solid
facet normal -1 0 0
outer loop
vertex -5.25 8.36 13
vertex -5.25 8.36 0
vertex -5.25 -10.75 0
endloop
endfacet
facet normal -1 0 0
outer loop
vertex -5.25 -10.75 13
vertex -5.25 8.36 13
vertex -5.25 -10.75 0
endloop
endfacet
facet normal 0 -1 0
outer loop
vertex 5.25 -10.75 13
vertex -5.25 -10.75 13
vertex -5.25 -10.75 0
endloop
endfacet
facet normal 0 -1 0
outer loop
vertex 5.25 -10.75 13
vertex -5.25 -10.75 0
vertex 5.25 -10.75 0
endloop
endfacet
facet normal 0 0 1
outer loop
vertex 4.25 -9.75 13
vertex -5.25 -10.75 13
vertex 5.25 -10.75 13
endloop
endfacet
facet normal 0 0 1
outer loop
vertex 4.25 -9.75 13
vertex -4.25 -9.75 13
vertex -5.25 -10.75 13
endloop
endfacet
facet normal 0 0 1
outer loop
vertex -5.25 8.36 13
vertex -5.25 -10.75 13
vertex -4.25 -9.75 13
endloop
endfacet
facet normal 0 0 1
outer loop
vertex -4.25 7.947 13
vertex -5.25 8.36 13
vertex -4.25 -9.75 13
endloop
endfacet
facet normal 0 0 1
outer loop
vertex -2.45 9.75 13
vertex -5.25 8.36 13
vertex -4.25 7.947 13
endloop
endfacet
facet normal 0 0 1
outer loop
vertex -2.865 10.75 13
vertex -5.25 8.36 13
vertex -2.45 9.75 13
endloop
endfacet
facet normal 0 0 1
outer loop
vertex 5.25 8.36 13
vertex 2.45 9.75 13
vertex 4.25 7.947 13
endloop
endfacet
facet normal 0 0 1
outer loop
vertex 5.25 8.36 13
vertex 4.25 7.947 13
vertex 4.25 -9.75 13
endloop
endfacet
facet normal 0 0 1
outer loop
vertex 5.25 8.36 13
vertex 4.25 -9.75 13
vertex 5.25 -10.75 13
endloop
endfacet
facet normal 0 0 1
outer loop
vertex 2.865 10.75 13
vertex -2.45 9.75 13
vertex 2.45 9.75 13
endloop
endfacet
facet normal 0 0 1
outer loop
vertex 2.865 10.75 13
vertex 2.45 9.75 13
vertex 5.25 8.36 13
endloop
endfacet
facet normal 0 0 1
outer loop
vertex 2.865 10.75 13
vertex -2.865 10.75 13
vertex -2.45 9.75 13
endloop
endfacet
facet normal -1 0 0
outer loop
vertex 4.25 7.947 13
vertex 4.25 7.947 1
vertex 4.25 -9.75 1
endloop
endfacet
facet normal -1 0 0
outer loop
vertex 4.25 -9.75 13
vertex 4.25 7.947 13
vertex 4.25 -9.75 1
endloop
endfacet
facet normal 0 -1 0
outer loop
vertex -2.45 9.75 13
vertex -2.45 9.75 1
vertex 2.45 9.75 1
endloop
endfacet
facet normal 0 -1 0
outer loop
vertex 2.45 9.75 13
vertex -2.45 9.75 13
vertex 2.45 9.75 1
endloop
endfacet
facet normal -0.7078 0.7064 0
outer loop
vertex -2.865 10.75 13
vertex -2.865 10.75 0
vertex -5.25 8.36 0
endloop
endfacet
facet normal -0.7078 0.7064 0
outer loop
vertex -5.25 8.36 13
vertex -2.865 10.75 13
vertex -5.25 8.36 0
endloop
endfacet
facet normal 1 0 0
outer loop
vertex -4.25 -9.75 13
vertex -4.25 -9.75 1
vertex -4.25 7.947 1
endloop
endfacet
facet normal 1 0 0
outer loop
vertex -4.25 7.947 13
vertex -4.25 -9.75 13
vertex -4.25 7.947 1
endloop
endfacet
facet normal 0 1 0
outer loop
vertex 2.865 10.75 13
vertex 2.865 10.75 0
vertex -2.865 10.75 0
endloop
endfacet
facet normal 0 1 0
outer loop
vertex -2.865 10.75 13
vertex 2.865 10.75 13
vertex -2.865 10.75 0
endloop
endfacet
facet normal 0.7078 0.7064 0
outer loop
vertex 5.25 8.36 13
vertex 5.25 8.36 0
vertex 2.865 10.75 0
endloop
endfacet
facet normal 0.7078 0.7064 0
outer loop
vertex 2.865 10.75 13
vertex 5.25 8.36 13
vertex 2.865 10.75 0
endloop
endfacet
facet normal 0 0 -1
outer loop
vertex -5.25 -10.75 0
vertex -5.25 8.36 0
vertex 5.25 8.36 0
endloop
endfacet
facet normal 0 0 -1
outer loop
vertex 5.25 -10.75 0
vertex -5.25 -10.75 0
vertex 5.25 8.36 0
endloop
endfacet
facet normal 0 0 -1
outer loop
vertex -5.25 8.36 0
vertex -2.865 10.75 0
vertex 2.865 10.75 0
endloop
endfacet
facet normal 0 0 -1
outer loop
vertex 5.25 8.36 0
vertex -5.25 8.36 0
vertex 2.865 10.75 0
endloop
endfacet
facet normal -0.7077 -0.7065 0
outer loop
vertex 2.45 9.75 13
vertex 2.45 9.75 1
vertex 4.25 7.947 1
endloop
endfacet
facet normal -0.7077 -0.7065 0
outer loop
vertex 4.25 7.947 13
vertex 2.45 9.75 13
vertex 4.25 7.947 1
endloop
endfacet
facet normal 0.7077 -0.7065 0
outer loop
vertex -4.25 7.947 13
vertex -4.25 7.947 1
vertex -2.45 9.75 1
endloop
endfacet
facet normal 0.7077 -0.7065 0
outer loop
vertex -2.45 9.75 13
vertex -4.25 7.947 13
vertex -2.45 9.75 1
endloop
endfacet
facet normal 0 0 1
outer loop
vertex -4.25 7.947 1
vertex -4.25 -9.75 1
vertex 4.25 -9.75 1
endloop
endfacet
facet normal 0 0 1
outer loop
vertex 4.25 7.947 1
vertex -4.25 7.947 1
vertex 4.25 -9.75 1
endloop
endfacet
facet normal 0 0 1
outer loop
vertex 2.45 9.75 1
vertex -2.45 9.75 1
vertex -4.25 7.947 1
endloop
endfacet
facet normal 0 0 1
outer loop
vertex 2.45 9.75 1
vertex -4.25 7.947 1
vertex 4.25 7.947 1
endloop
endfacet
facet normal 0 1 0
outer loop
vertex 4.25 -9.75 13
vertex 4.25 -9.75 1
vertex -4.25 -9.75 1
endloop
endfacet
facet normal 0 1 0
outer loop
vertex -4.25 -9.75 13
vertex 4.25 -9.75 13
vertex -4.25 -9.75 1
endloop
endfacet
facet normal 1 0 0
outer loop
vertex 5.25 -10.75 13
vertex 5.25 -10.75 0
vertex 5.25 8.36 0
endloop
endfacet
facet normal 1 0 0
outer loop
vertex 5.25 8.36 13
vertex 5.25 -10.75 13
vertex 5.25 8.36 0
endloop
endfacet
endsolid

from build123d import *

# Parameters (mm, degrees)
F1_DEPTH = 1
F2_DEPTH = 13


with BuildPart() as f1:
    # F0 (on Top) → F1 (new body)
    with BuildSketch(Plane.XY):
        Polygon((2.864766, 10.75), (-2.864766, 10.75), (-5.25, 8.360261), (-5.25, -10.75), (5.25, -10.75), (5.25, 8.360261), align=None)
        Polygon((-4.25, 7.9466), (-2.45, 9.75), (2.45, 9.75), (4.25, 7.9466), (4.25, -9.75), (-4.25, -9.75), align=None, mode=Mode.SUBTRACT)
        Polygon((2.45, 9.75), (-2.45, 9.75), (-4.25, 7.9466), (-4.25, -9.75), (4.25, -9.75), (4.25, 7.9466), align=None)
    extrude(amount=F1_DEPTH)

    # F0 (on Top) → F2 (join)
    with BuildSketch(Plane.XY):
        Polygon((2.864766, 10.75), (-2.864766, 10.75), (-5.25, 8.360261), (-5.25, -10.75), (5.25, -10.75), (5.25, 8.360261), align=None)
        Polygon((-4.25, 7.9466), (-2.45, 9.75), (2.45, 9.75), (4.25, 7.9466), (4.25, -9.75), (-4.25, -9.75), align=None, mode=Mode.SUBTRACT)
    extrude(amount=F2_DEPTH)


solid = f1.part
